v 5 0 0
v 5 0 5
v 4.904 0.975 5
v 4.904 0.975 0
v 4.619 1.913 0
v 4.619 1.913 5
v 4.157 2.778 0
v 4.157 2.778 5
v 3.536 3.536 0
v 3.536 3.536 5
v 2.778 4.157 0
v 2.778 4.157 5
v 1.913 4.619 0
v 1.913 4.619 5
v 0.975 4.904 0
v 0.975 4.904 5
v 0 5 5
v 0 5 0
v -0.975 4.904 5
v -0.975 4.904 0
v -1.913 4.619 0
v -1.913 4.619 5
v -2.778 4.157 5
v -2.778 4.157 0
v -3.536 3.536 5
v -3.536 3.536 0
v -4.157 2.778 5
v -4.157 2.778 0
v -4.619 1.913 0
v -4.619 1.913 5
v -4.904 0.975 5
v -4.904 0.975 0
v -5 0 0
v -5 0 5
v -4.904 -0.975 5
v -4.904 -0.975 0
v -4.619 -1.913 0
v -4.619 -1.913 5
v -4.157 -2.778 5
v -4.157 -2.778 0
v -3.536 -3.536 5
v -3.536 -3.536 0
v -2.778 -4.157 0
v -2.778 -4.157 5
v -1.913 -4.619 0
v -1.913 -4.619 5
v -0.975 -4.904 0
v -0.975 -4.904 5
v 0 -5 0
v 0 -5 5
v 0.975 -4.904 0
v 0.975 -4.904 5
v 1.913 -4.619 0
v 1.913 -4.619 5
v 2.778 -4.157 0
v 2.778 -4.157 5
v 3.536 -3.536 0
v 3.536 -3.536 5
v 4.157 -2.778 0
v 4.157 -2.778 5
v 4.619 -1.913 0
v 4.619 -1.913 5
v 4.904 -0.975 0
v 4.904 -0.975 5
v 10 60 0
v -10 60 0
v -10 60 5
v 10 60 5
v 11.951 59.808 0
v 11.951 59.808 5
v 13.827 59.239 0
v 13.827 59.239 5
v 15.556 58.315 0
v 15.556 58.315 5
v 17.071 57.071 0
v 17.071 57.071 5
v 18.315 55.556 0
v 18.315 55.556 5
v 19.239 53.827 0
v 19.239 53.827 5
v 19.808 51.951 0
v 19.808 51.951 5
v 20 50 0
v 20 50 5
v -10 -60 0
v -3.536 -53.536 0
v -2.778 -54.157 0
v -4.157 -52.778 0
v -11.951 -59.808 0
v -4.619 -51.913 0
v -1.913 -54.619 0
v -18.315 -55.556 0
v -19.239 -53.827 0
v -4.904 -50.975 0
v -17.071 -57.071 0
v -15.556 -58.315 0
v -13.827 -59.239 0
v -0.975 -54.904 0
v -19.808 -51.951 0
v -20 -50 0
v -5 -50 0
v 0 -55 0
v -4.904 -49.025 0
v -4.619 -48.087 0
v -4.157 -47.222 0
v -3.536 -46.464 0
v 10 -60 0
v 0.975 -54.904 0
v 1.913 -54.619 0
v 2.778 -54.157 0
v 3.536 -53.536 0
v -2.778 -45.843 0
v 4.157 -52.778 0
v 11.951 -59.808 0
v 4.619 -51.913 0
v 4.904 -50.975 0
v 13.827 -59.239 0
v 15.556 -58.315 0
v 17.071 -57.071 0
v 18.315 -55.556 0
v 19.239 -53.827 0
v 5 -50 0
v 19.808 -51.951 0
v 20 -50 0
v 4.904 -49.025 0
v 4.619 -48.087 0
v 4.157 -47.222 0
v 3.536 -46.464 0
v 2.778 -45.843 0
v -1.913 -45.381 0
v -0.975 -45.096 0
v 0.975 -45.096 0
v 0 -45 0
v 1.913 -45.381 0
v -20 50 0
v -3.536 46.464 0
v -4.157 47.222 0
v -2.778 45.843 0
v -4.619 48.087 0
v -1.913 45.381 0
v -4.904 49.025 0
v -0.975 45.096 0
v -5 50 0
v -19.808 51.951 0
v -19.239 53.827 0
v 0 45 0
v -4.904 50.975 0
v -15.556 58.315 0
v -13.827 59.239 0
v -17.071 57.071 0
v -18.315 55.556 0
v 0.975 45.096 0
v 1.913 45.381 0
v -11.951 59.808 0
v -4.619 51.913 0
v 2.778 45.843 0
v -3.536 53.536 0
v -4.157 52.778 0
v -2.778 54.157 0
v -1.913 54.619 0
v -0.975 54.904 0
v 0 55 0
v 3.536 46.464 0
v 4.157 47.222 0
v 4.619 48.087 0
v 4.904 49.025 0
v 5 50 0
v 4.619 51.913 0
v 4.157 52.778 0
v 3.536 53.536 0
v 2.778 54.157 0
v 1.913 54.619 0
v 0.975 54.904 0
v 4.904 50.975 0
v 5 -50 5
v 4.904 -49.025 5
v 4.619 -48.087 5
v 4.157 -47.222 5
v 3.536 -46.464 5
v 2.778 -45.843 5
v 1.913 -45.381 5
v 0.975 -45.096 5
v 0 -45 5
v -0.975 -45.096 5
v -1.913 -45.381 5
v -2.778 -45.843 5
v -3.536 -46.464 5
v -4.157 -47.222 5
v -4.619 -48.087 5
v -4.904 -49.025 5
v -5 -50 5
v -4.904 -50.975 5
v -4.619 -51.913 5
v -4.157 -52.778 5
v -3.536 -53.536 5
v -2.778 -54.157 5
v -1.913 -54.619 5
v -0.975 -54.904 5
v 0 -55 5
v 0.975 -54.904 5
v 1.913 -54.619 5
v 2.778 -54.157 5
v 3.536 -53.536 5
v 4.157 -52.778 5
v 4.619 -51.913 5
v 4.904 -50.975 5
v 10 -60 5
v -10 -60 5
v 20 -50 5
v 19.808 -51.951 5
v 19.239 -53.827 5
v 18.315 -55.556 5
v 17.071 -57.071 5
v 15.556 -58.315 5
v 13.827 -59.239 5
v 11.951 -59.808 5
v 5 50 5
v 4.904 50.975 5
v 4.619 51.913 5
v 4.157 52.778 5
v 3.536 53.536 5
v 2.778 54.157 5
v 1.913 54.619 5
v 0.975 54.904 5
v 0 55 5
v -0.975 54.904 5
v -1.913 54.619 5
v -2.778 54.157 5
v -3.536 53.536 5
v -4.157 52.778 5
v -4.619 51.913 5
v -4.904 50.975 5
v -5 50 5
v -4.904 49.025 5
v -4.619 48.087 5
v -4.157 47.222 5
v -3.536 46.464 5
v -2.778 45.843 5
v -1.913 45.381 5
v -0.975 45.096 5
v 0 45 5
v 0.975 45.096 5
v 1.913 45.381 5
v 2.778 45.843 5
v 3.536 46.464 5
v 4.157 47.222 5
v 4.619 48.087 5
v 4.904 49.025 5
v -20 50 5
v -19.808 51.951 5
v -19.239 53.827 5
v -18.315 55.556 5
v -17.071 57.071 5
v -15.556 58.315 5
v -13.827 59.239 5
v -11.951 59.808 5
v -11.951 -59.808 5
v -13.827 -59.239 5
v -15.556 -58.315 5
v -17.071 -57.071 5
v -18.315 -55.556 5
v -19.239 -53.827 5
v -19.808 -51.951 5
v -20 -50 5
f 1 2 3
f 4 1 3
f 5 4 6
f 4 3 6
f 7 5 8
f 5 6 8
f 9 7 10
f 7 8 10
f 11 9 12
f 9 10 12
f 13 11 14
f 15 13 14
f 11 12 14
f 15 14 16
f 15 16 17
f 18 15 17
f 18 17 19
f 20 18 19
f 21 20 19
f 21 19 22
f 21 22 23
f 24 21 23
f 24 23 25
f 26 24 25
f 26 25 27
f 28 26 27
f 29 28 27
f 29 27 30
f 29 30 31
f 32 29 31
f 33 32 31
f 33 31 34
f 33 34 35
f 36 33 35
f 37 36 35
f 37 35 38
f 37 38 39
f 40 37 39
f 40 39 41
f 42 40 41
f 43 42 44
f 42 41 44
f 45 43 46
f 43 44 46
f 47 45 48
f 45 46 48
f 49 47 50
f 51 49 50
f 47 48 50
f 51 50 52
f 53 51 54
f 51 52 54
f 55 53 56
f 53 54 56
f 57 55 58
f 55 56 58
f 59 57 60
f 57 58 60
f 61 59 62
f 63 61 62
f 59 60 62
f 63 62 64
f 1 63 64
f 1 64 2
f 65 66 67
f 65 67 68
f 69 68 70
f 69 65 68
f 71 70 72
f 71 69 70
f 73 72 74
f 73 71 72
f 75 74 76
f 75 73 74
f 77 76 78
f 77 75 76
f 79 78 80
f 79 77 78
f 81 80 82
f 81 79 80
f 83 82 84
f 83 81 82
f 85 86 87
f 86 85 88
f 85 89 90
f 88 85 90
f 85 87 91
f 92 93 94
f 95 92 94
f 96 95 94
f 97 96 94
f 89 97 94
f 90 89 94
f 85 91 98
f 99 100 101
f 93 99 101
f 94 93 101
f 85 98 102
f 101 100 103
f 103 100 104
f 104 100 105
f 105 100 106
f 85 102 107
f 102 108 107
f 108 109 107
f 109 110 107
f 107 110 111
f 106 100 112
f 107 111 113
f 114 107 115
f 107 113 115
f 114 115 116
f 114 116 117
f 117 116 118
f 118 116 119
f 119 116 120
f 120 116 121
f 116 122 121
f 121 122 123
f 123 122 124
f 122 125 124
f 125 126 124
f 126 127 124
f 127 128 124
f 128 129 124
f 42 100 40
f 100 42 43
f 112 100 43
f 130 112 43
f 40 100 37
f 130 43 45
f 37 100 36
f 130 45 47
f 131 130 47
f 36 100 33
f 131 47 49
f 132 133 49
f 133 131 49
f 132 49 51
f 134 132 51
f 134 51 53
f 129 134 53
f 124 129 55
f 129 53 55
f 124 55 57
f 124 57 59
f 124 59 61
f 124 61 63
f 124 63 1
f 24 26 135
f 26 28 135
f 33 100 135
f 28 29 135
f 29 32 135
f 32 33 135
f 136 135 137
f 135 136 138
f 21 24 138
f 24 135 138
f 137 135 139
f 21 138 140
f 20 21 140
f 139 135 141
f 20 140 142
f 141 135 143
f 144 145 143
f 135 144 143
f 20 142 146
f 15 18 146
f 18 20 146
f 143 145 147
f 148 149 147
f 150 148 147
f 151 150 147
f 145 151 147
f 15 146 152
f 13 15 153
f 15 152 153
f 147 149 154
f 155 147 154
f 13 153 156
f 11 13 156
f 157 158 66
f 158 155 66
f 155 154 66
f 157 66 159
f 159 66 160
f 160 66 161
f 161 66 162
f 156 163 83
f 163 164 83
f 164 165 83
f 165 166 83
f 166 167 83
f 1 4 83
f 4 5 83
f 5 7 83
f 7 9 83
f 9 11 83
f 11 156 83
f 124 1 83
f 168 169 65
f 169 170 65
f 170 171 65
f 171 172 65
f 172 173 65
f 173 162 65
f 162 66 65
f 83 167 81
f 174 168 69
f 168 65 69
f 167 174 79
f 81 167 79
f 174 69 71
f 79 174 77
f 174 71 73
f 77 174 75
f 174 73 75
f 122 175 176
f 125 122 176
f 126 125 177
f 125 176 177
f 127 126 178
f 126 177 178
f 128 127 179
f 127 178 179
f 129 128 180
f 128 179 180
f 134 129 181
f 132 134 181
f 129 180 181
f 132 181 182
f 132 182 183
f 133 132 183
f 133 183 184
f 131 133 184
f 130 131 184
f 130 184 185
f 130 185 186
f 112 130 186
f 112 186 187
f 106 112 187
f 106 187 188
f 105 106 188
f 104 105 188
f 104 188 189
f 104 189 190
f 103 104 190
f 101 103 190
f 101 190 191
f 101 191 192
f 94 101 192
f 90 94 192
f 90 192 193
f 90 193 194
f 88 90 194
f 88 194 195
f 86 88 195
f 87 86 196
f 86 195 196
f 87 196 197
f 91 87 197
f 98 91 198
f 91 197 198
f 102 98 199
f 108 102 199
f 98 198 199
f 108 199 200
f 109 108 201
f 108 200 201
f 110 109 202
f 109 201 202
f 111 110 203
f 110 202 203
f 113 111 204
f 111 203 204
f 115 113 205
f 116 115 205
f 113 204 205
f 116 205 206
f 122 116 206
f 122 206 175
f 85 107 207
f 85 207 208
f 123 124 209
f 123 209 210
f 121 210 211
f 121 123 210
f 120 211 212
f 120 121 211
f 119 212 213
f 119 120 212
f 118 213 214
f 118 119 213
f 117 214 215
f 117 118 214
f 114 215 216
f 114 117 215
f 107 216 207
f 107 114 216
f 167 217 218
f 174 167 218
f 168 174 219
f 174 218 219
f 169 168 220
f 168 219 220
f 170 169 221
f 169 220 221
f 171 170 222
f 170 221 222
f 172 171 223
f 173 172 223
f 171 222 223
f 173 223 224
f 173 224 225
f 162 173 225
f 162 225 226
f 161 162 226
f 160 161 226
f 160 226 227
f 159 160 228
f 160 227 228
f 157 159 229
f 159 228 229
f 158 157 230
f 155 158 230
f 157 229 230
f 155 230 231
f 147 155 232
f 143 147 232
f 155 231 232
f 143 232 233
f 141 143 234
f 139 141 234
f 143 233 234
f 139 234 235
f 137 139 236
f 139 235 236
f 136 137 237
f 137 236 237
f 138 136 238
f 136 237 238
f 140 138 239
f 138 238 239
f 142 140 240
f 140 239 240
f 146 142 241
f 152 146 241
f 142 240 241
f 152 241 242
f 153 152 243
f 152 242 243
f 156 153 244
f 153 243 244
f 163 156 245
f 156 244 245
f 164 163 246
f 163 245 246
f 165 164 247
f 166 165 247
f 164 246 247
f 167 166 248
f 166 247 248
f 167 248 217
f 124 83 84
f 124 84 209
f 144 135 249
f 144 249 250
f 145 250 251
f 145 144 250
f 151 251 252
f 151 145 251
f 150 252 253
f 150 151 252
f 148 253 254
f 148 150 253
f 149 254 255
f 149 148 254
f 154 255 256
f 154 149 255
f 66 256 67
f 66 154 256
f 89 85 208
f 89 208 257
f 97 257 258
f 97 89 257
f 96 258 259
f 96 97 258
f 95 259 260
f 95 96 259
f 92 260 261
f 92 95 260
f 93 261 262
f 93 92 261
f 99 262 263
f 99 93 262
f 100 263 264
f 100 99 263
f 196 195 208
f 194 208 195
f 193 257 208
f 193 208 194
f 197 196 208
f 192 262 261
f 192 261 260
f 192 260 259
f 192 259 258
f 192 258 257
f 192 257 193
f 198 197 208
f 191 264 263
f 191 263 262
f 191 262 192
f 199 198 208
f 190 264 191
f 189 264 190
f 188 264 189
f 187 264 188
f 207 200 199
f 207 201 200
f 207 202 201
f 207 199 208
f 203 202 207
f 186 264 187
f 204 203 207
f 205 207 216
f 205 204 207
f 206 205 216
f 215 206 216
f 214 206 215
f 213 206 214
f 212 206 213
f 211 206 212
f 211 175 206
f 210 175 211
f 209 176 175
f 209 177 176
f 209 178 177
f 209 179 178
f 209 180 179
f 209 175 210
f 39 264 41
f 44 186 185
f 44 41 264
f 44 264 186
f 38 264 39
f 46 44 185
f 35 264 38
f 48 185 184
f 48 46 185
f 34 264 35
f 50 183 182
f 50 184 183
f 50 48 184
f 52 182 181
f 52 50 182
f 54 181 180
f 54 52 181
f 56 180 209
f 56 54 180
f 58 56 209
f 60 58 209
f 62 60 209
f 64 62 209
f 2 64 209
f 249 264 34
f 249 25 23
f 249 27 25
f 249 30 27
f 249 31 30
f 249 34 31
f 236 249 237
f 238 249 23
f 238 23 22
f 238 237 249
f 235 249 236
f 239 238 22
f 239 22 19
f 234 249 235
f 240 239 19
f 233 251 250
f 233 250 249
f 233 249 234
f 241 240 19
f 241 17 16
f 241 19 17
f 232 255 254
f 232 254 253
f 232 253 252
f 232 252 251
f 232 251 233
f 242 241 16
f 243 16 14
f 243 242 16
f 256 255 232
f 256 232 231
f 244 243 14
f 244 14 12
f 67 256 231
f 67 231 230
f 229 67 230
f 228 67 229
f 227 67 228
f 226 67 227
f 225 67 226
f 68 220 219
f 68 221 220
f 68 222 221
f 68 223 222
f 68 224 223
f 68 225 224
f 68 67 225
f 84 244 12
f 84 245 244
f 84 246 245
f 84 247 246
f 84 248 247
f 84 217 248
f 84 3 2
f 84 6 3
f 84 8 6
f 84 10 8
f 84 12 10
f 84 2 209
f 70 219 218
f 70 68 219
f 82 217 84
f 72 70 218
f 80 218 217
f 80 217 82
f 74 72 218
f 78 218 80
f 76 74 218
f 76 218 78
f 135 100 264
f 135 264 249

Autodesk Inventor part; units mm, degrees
ref_plane "YZ Plane" through (0, 0, 0) normal (1, 0, 0) x (0, 1, 0)
ref_plane "XZ Plane" through (0, 0, 0) normal (0, 1, 0) x (-1, 0, 0)
ref_plane "XY Plane" through (0, 0, 0) normal (0, 0, 1) x (1, 0, 0)
sketch "Sketch1" plane through (0, 0, 0) normal (0, 0, 1) x (1, 0, 0)
  line L0 (-10, 60) -> (10, 60)
  line L1 (20, 50) -> (20, -50)
  line L2 (10, -60) -> (-10, -60)
  line L3 (-20, -50) -> (-20, 50)
  arc A0 (-10, 60) -> (-20, 50) centre (-10, 50) ccw
  arc A1 (20, 50) -> (10, 60) centre (10, 50) ccw
  arc A2 (10, -60) -> (20, -50) centre (10, -50) ccw
  arc A3 (-20, -50) -> (-10, -60) centre (-10, -50) ccw
  point P0 (0, 0)
  point P1 (20, 0)
  point P2 (0, 60)
  dimension "d0" = 10
  dimension "d1" = 40
  dimension "d2" = 120
extrude "Extrusion1" add sketch "Sketch1" along normal blind 5
sketch "Sketch2" plane through (0, 0, 5) normal (0, 0, 1) x (1, 0, 0)
  circle A0 centre (0, 50) radius 5
  line L0 (-20, 50) -> (-20, -50) construction
  line L1 (-20, 0) -> (20, 0) construction
  line L2 (20, -50) -> (20, 50) construction
  line L3 (10, 60) -> (-10, 60) projected
  circle A1 centre (0, -50) radius 5
  circle A2 centre (0, 0) radius 5
  point P0 (0, 0)
  dimension "d5" = 10
  dimension "d7" = 10
  dimension "d8" = 10
extrude "Extrusion2" cut sketch "Sketch2" against normal up to surface (5 mm away)
properties part number "mitad"
